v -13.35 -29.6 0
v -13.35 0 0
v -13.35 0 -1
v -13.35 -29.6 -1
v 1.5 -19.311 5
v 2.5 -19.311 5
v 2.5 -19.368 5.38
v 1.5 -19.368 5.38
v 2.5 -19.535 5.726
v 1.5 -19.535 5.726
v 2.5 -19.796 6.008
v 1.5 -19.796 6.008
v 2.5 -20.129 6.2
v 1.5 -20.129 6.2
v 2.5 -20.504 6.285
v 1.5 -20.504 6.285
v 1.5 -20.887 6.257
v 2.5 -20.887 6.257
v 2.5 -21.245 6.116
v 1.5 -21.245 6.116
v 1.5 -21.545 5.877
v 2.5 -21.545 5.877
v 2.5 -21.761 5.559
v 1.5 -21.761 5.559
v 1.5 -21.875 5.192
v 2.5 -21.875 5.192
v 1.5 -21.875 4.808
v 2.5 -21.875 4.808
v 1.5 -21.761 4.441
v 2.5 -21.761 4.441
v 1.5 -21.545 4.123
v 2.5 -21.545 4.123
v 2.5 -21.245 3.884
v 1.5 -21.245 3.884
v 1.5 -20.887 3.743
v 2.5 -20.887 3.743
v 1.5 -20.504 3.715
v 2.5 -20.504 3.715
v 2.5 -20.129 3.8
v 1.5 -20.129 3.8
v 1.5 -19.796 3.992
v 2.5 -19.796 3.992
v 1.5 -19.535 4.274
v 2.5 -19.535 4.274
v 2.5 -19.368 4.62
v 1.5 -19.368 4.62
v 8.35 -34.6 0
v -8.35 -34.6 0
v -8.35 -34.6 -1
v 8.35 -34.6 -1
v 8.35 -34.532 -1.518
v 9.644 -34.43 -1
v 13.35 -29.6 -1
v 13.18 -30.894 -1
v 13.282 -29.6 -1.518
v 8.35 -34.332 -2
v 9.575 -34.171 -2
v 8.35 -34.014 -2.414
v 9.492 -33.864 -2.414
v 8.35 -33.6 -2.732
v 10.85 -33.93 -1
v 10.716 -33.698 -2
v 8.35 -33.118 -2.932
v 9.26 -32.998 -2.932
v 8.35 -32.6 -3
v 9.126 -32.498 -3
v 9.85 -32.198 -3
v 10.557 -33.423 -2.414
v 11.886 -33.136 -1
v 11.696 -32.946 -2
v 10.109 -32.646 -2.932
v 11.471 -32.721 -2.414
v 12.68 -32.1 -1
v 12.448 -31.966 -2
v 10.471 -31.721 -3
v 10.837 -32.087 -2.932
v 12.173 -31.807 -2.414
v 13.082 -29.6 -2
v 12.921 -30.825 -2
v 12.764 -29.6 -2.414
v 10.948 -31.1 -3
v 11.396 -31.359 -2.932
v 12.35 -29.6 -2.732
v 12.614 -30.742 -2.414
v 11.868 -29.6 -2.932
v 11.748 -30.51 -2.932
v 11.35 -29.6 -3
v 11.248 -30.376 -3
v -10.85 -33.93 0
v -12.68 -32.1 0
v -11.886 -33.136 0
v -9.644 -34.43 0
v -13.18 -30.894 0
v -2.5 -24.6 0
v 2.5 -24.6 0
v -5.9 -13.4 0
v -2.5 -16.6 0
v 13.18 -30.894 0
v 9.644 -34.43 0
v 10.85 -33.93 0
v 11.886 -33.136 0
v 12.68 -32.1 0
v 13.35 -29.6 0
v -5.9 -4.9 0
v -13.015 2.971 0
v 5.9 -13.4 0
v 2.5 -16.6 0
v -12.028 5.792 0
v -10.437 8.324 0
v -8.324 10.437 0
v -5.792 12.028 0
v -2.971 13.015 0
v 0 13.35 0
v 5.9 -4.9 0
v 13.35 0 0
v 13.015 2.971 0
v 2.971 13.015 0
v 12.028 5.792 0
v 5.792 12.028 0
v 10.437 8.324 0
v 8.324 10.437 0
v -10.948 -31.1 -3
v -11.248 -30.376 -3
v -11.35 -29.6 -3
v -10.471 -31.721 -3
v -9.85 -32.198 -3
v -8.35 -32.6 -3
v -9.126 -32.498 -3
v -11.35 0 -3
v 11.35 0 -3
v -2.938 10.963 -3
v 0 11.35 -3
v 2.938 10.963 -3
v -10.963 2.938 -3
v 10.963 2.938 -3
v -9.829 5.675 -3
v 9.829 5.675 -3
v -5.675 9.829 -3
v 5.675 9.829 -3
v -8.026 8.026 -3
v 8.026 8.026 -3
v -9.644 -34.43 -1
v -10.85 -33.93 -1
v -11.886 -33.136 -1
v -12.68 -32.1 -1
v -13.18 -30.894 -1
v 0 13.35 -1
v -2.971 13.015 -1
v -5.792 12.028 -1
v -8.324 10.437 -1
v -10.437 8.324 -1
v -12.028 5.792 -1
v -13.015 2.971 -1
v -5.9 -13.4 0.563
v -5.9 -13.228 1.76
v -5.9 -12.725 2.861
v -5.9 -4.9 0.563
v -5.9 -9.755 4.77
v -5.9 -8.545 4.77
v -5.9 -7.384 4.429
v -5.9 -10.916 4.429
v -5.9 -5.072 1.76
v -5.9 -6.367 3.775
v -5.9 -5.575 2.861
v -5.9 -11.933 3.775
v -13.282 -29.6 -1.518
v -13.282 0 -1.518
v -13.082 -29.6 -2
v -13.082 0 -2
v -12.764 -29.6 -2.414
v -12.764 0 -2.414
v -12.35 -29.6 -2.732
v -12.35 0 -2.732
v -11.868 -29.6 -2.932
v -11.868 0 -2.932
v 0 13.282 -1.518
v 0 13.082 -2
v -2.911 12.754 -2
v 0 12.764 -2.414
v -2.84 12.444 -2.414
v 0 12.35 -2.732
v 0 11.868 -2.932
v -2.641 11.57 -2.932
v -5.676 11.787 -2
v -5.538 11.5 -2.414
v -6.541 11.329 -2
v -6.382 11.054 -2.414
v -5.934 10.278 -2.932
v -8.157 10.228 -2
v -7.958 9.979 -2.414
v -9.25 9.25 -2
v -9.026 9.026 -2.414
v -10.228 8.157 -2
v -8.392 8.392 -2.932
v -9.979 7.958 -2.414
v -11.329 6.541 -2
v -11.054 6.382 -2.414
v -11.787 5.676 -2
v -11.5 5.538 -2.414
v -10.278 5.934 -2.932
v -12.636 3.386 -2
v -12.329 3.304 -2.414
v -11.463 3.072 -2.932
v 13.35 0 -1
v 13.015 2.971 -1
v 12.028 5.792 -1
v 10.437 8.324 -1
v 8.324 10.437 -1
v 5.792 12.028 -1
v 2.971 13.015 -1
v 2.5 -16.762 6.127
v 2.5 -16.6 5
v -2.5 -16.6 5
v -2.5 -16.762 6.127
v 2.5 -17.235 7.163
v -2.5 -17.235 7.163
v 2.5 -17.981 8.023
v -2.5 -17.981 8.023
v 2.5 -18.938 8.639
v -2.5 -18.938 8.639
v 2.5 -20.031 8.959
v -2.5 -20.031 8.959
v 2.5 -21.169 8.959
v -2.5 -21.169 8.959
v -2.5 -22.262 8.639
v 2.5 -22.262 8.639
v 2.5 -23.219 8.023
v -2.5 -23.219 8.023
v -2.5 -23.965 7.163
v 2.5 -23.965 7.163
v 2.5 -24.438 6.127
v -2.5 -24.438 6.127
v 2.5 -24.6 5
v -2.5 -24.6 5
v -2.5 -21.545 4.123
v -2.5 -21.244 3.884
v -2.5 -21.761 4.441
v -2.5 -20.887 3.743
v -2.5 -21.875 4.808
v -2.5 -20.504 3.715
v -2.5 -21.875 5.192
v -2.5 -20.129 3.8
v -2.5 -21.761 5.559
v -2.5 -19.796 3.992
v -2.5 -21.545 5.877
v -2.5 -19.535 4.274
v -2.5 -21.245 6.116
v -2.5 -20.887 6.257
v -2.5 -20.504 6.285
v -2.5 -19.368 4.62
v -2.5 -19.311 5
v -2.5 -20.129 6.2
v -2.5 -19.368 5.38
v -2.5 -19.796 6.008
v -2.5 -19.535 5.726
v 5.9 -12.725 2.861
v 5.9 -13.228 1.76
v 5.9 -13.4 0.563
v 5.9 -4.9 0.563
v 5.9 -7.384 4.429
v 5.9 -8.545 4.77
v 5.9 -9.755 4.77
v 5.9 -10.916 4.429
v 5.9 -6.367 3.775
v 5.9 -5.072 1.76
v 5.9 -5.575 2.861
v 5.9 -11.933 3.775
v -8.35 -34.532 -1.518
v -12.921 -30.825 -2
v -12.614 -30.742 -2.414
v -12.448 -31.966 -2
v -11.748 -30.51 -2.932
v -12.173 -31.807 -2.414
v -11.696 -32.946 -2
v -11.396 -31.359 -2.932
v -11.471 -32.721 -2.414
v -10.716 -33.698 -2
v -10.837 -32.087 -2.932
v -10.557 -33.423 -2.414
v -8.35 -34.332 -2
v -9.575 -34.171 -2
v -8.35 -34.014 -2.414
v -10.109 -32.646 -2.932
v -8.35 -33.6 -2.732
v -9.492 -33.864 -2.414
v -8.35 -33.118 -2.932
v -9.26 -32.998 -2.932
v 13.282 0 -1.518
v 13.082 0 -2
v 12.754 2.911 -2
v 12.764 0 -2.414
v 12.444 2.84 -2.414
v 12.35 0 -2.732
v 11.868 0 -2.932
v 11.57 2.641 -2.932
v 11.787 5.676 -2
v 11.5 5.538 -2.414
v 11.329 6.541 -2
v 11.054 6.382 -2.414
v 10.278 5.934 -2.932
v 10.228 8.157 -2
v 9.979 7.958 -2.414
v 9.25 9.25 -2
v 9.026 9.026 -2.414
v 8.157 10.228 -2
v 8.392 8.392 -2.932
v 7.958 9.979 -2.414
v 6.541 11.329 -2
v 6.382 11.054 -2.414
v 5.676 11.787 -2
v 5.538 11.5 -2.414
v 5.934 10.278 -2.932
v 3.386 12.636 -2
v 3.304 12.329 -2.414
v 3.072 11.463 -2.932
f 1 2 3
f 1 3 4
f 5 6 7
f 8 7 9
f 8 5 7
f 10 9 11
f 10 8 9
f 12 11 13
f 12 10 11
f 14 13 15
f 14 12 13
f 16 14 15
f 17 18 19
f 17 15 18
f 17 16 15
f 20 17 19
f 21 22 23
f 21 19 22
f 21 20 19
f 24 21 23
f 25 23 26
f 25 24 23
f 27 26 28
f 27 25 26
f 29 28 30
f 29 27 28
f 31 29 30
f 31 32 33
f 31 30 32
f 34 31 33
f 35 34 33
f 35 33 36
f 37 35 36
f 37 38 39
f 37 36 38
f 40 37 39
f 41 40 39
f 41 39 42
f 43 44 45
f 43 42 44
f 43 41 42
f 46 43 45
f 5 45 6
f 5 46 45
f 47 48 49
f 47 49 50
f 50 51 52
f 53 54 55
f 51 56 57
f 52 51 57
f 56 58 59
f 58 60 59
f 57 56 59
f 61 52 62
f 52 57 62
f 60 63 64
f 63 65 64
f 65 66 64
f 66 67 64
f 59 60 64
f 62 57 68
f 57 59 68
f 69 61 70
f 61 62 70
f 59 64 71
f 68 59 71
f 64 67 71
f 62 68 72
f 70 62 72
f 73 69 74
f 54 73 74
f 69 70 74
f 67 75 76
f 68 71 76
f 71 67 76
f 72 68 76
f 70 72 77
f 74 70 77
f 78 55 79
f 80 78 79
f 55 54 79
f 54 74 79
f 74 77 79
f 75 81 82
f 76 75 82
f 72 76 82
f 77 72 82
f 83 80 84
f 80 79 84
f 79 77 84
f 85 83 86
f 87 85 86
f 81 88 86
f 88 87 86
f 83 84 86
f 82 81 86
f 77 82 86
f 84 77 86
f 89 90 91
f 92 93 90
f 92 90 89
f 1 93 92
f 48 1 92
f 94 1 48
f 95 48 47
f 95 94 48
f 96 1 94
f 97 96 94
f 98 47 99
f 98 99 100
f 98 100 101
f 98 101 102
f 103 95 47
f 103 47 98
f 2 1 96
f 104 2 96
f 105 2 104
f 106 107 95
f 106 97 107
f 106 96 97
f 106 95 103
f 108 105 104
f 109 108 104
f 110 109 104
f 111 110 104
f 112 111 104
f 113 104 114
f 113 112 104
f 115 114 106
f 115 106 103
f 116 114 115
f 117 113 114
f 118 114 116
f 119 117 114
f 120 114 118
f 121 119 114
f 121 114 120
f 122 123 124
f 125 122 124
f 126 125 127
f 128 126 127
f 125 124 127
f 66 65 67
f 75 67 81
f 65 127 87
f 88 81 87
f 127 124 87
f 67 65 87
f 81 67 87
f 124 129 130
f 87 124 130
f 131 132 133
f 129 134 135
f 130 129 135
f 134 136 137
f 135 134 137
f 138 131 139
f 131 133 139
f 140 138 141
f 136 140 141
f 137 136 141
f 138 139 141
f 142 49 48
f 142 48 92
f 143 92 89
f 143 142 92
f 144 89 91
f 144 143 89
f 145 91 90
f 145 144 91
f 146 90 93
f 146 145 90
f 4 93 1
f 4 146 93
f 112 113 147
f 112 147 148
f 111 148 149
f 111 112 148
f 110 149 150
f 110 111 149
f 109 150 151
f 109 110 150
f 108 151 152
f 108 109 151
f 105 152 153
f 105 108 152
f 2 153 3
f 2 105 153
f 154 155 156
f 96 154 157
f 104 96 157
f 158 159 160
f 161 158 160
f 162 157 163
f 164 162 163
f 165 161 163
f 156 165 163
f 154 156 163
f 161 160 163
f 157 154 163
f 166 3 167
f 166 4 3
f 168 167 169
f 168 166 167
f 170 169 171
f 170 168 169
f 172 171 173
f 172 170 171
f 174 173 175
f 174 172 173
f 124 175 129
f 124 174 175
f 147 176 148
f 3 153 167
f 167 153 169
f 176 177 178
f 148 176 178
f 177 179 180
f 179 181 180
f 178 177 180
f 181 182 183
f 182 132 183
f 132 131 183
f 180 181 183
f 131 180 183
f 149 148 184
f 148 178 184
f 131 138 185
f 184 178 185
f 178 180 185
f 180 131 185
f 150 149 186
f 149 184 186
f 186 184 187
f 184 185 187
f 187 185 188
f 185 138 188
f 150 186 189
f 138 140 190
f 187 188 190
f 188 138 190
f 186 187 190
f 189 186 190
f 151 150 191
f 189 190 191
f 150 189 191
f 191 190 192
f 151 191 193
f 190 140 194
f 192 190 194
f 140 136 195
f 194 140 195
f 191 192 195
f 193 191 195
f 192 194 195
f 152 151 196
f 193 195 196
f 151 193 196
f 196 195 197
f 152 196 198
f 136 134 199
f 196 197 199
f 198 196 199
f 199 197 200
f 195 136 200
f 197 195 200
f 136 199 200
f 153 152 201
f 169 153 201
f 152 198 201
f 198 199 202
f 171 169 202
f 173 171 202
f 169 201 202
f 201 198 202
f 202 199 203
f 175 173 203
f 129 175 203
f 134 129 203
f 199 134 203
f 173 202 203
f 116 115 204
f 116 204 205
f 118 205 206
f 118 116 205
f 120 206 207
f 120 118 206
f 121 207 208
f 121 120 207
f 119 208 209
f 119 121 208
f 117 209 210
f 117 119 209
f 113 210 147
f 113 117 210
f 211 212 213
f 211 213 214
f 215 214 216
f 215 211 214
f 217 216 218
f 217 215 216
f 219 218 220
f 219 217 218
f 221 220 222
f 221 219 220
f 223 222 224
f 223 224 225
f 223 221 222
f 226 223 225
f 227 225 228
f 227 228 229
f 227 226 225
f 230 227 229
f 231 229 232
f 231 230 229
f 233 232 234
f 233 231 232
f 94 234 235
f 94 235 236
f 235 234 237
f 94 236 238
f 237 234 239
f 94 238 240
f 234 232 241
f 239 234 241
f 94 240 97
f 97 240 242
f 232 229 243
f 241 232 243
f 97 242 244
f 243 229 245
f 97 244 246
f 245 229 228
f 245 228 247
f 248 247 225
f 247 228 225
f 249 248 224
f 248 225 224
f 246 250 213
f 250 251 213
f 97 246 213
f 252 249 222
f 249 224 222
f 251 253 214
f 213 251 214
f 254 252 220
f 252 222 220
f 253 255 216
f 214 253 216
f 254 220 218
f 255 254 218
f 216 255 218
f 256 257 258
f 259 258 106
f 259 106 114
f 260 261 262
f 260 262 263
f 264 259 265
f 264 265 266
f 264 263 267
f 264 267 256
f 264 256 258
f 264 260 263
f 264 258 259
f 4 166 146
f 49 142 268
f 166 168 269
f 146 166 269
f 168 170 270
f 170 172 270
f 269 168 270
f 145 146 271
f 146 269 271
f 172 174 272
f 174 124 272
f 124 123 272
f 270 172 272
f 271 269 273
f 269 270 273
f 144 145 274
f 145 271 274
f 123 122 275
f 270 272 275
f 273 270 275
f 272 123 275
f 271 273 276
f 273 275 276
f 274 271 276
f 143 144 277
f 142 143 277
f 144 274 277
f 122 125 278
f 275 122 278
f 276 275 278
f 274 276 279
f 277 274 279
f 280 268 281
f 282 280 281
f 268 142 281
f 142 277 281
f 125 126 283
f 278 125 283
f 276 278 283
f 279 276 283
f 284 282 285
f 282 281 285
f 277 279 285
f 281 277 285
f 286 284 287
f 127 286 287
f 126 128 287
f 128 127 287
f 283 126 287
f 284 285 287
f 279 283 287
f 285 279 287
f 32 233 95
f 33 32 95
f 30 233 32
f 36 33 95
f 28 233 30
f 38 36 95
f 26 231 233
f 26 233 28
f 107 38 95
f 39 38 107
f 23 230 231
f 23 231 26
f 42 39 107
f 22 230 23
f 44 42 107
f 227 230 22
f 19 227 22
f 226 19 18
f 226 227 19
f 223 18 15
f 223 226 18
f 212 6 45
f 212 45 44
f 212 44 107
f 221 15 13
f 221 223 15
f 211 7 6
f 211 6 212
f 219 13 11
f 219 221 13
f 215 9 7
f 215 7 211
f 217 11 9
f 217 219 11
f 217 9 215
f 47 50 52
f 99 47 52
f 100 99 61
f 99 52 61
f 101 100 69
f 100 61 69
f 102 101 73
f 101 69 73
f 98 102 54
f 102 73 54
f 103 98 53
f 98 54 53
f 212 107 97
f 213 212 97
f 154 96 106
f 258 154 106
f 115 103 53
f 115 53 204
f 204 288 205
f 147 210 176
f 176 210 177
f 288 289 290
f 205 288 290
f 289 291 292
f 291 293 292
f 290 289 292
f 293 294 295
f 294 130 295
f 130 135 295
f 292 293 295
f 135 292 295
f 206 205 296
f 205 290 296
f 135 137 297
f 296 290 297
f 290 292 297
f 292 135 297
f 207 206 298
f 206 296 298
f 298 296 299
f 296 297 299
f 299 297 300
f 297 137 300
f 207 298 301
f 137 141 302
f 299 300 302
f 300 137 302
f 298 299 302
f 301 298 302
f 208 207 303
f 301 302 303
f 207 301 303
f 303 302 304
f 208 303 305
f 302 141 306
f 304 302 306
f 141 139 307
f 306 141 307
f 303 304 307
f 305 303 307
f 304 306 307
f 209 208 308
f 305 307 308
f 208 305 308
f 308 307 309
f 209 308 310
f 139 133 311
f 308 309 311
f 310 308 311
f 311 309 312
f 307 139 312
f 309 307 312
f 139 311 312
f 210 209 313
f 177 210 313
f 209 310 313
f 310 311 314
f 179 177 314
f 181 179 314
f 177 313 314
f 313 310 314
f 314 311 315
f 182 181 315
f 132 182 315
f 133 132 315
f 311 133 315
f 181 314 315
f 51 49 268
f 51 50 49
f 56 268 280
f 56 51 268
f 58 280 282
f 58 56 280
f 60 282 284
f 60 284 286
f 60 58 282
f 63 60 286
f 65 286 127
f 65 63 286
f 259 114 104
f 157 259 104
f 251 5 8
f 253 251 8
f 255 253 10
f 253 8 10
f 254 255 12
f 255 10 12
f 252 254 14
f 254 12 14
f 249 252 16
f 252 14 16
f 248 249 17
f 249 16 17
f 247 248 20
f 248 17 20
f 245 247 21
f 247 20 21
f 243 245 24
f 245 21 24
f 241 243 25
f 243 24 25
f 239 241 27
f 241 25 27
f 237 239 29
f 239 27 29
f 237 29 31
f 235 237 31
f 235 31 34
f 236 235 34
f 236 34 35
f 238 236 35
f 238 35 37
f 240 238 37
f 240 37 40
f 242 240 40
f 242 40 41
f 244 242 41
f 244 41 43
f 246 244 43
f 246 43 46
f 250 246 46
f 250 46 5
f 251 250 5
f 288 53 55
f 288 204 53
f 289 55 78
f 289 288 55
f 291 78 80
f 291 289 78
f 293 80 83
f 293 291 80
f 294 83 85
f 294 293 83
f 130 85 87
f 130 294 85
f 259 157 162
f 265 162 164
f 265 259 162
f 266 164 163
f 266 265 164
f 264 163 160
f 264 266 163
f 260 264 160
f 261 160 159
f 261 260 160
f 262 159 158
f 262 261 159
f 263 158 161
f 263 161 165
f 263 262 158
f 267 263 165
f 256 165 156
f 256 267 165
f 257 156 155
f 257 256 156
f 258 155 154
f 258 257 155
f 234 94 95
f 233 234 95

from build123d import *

# Parameters (mm, degrees)
F0_W      = 10.85
F0_H      = 10
F0_W_2    = 2.5
F0_H_2    = 8
F0_W_3    = 7.45
F0_H_3    = 3.2
F0_H_4    = 8.5
F0_W_4    = 5.9
F1_DEPTH  = 3
F2_DEPTH  = 0.563
F3_DEPTH  = 5
F6_DEPTH  = 11.8
F7_DEPTH  = 5
F8_DEPTH  = 25
F9_R      = 2.056128731
F10_DEPTH = 1
F11_R     = 5
F12_R     = 5
F13_R     = 2
F14_DEPTH = 25


with BuildPart() as f1:
    # F0 (on Top) → F1 (new body)
    with BuildSketch(Plane.XY):
        Polygon((-5.9, -16.6), (-13.35, -16.6), (-13.35, -24.6), (-2.5, -24.6), (-2.5, -16.6), align=None)
        with Locations((-7.925, -29.6)):
            Rectangle(F0_W, F0_H)
        with Locations((1.25, -29.6)):
            Rectangle(F0_W_2, F0_H)
        with Locations((-1.25, -29.6)):
            Rectangle(F0_W_2, F0_H)
        with Locations((-1.25, -20.6)):
            Rectangle(F0_W_2, F0_H_2)
        with Locations((1.25, -20.6)):
            Rectangle(F0_W_2, F0_H_2)
        Polygon((13.35, -24.6), (13.35, -16.6), (5.9, -16.6), (2.5, -16.6), (2.5, -24.6), align=None)
        with Locations((7.925, -29.6)):
            Rectangle(F0_W, F0_H)
        Polygon((5.9, -13.4), (0, -13.4), (0, -16.6), (2.5, -16.6), (5.9, -16.6), align=None)
        with Locations((9.625, -15)):
            Rectangle(F0_W_3, F0_H_3)
        Polygon((0, -16.6), (0, -13.4), (-5.9, -13.4), (-5.9, -16.6), (-2.5, -16.6), align=None)
        with Locations((-9.625, -15)):
            Rectangle(F0_W_3, F0_H_3)
        with Locations((-9.625, -9.15)):
            Rectangle(F0_W_3, F0_H_4)
        with Locations((-2.95, -9.15)):
            Rectangle(F0_W_4, F0_H_4)
        with Locations((2.95, -9.15)):
            Rectangle(F0_W_4, F0_H_4)
        with Locations((9.625, -9.15)):
            Rectangle(F0_W_3, F0_H_4)
        with BuildLine():
            Line((13.35, -4.9), (13.35, 0))
            ThreePointArc((13.35, 0), (9.4398755288, 9.4398755288), (0, 13.35))
            Line((0, 13.35), (0, -4.9))
            Line((0, -4.9), (5.9, -4.9))
            Line((5.9, -4.9), (13.35, -4.9))
        make_face()
        with BuildLine():
            Line((0, -4.9), (0, 13.35))
            ThreePointArc((0, 13.35), (-9.4398755288, 9.4398755288), (-13.35, 0))
            Line((-13.35, 0), (-13.35, -4.9))
            Line((-13.35, -4.9), (-5.9, -4.9))
            Line((-5.9, -4.9), (0, -4.9))
        make_face()
    extrude(amount=-F1_DEPTH)

    # F0 (on Top) → F2 (join)
    with BuildSketch(Plane.XY):
        with Locations((-2.95, -9.15)):
            Rectangle(F0_W_4, F0_H_4)
        with Locations((2.95, -9.15)):
            Rectangle(F0_W_4, F0_H_4)
    extrude(amount=F2_DEPTH)

    # F0 (on Top) → F3 (join)
    with BuildSketch(Plane.XY):
        with Locations((1.25, -20.6)):
            Rectangle(F0_W_2, F0_H_2)
        with Locations((-1.25, -20.6)):
            Rectangle(F0_W_2, F0_H_2)
    extrude(amount=F3_DEPTH)

    # F5 (on face) → F6 (join)
    with BuildSketch(Plane.YZ.offset(5.9)):
        with BuildLine():
            Line((-13.4, 0.563), (-4.9, 0.563))
            ThreePointArc((-4.9, 0.563), (-9.15, 4.813), (-13.4, 0.563))
        make_face()
    extrude(amount=-F6_DEPTH)

    # F4 (on face) → F7 (join)
    with BuildSketch(Plane.YZ.offset(2.5)):
        with BuildLine():
            Line((-19.311, 5), (-16.6, 5))
            ThreePointArc((-16.6, 5), (-20.6, 9), (-24.6, 5))
            Line((-24.6, 5), (-21.889, 5))
            ThreePointArc((-21.889, 5), (-20.6, 6.289), (-19.311, 5))
        make_face()
    extrude(amount=-F7_DEPTH)

    # F4 (on face) → F8 (cut)
    with BuildSketch(Plane.YZ.offset(2.5)):
        with BuildLine():
            ThreePointArc((-21.889, 5), (-20.6, 3.711), (-19.311, 5))
            Line((-19.311, 5), (-21.889, 5))
        make_face()
        with BuildLine():
            Line((-21.889, 5), (-19.311, 5))
            ThreePointArc((-19.311, 5), (-20.6, 6.289), (-21.889, 5))
        make_face()
    extrude(amount=-F8_DEPTH, mode=Mode.SUBTRACT)

    # F9 (on face) → F10 (join)
    with BuildSketch(Plane.YZ.offset(2.5)):
        with Locations((-20.6, 5)):
            Circle(F9_R)
    extrude(amount=-F10_DEPTH)

    # F11
    f11_edges = [f1.edges().sort_by_distance(p)[0] for p in [
        (13.35, -34.6, -1.5),
    ]]
    fillet(f11_edges, radius=F11_R)

    # F12
    f12_edges = [f1.edges().sort_by_distance(p)[0] for p in [
        (-13.35, -34.6, -1.5),
    ]]
    fillet(f12_edges, radius=F12_R)

    # F13
    f13_edges = [f1.edges().sort_by_distance(p)[0] for p in [
        (0, -34.6, -3),
    ]]
    fillet(f13_edges, radius=F13_R)

    # F14 (cut): a face of the model
    f14_faces = [f1.faces().sort_by_distance(p)[0] for p in [
        (1.5, -20.6, 5),
    ]]
    extrude(f14_faces, amount=-F14_DEPTH, mode=Mode.SUBTRACT)


solid = f1.part
